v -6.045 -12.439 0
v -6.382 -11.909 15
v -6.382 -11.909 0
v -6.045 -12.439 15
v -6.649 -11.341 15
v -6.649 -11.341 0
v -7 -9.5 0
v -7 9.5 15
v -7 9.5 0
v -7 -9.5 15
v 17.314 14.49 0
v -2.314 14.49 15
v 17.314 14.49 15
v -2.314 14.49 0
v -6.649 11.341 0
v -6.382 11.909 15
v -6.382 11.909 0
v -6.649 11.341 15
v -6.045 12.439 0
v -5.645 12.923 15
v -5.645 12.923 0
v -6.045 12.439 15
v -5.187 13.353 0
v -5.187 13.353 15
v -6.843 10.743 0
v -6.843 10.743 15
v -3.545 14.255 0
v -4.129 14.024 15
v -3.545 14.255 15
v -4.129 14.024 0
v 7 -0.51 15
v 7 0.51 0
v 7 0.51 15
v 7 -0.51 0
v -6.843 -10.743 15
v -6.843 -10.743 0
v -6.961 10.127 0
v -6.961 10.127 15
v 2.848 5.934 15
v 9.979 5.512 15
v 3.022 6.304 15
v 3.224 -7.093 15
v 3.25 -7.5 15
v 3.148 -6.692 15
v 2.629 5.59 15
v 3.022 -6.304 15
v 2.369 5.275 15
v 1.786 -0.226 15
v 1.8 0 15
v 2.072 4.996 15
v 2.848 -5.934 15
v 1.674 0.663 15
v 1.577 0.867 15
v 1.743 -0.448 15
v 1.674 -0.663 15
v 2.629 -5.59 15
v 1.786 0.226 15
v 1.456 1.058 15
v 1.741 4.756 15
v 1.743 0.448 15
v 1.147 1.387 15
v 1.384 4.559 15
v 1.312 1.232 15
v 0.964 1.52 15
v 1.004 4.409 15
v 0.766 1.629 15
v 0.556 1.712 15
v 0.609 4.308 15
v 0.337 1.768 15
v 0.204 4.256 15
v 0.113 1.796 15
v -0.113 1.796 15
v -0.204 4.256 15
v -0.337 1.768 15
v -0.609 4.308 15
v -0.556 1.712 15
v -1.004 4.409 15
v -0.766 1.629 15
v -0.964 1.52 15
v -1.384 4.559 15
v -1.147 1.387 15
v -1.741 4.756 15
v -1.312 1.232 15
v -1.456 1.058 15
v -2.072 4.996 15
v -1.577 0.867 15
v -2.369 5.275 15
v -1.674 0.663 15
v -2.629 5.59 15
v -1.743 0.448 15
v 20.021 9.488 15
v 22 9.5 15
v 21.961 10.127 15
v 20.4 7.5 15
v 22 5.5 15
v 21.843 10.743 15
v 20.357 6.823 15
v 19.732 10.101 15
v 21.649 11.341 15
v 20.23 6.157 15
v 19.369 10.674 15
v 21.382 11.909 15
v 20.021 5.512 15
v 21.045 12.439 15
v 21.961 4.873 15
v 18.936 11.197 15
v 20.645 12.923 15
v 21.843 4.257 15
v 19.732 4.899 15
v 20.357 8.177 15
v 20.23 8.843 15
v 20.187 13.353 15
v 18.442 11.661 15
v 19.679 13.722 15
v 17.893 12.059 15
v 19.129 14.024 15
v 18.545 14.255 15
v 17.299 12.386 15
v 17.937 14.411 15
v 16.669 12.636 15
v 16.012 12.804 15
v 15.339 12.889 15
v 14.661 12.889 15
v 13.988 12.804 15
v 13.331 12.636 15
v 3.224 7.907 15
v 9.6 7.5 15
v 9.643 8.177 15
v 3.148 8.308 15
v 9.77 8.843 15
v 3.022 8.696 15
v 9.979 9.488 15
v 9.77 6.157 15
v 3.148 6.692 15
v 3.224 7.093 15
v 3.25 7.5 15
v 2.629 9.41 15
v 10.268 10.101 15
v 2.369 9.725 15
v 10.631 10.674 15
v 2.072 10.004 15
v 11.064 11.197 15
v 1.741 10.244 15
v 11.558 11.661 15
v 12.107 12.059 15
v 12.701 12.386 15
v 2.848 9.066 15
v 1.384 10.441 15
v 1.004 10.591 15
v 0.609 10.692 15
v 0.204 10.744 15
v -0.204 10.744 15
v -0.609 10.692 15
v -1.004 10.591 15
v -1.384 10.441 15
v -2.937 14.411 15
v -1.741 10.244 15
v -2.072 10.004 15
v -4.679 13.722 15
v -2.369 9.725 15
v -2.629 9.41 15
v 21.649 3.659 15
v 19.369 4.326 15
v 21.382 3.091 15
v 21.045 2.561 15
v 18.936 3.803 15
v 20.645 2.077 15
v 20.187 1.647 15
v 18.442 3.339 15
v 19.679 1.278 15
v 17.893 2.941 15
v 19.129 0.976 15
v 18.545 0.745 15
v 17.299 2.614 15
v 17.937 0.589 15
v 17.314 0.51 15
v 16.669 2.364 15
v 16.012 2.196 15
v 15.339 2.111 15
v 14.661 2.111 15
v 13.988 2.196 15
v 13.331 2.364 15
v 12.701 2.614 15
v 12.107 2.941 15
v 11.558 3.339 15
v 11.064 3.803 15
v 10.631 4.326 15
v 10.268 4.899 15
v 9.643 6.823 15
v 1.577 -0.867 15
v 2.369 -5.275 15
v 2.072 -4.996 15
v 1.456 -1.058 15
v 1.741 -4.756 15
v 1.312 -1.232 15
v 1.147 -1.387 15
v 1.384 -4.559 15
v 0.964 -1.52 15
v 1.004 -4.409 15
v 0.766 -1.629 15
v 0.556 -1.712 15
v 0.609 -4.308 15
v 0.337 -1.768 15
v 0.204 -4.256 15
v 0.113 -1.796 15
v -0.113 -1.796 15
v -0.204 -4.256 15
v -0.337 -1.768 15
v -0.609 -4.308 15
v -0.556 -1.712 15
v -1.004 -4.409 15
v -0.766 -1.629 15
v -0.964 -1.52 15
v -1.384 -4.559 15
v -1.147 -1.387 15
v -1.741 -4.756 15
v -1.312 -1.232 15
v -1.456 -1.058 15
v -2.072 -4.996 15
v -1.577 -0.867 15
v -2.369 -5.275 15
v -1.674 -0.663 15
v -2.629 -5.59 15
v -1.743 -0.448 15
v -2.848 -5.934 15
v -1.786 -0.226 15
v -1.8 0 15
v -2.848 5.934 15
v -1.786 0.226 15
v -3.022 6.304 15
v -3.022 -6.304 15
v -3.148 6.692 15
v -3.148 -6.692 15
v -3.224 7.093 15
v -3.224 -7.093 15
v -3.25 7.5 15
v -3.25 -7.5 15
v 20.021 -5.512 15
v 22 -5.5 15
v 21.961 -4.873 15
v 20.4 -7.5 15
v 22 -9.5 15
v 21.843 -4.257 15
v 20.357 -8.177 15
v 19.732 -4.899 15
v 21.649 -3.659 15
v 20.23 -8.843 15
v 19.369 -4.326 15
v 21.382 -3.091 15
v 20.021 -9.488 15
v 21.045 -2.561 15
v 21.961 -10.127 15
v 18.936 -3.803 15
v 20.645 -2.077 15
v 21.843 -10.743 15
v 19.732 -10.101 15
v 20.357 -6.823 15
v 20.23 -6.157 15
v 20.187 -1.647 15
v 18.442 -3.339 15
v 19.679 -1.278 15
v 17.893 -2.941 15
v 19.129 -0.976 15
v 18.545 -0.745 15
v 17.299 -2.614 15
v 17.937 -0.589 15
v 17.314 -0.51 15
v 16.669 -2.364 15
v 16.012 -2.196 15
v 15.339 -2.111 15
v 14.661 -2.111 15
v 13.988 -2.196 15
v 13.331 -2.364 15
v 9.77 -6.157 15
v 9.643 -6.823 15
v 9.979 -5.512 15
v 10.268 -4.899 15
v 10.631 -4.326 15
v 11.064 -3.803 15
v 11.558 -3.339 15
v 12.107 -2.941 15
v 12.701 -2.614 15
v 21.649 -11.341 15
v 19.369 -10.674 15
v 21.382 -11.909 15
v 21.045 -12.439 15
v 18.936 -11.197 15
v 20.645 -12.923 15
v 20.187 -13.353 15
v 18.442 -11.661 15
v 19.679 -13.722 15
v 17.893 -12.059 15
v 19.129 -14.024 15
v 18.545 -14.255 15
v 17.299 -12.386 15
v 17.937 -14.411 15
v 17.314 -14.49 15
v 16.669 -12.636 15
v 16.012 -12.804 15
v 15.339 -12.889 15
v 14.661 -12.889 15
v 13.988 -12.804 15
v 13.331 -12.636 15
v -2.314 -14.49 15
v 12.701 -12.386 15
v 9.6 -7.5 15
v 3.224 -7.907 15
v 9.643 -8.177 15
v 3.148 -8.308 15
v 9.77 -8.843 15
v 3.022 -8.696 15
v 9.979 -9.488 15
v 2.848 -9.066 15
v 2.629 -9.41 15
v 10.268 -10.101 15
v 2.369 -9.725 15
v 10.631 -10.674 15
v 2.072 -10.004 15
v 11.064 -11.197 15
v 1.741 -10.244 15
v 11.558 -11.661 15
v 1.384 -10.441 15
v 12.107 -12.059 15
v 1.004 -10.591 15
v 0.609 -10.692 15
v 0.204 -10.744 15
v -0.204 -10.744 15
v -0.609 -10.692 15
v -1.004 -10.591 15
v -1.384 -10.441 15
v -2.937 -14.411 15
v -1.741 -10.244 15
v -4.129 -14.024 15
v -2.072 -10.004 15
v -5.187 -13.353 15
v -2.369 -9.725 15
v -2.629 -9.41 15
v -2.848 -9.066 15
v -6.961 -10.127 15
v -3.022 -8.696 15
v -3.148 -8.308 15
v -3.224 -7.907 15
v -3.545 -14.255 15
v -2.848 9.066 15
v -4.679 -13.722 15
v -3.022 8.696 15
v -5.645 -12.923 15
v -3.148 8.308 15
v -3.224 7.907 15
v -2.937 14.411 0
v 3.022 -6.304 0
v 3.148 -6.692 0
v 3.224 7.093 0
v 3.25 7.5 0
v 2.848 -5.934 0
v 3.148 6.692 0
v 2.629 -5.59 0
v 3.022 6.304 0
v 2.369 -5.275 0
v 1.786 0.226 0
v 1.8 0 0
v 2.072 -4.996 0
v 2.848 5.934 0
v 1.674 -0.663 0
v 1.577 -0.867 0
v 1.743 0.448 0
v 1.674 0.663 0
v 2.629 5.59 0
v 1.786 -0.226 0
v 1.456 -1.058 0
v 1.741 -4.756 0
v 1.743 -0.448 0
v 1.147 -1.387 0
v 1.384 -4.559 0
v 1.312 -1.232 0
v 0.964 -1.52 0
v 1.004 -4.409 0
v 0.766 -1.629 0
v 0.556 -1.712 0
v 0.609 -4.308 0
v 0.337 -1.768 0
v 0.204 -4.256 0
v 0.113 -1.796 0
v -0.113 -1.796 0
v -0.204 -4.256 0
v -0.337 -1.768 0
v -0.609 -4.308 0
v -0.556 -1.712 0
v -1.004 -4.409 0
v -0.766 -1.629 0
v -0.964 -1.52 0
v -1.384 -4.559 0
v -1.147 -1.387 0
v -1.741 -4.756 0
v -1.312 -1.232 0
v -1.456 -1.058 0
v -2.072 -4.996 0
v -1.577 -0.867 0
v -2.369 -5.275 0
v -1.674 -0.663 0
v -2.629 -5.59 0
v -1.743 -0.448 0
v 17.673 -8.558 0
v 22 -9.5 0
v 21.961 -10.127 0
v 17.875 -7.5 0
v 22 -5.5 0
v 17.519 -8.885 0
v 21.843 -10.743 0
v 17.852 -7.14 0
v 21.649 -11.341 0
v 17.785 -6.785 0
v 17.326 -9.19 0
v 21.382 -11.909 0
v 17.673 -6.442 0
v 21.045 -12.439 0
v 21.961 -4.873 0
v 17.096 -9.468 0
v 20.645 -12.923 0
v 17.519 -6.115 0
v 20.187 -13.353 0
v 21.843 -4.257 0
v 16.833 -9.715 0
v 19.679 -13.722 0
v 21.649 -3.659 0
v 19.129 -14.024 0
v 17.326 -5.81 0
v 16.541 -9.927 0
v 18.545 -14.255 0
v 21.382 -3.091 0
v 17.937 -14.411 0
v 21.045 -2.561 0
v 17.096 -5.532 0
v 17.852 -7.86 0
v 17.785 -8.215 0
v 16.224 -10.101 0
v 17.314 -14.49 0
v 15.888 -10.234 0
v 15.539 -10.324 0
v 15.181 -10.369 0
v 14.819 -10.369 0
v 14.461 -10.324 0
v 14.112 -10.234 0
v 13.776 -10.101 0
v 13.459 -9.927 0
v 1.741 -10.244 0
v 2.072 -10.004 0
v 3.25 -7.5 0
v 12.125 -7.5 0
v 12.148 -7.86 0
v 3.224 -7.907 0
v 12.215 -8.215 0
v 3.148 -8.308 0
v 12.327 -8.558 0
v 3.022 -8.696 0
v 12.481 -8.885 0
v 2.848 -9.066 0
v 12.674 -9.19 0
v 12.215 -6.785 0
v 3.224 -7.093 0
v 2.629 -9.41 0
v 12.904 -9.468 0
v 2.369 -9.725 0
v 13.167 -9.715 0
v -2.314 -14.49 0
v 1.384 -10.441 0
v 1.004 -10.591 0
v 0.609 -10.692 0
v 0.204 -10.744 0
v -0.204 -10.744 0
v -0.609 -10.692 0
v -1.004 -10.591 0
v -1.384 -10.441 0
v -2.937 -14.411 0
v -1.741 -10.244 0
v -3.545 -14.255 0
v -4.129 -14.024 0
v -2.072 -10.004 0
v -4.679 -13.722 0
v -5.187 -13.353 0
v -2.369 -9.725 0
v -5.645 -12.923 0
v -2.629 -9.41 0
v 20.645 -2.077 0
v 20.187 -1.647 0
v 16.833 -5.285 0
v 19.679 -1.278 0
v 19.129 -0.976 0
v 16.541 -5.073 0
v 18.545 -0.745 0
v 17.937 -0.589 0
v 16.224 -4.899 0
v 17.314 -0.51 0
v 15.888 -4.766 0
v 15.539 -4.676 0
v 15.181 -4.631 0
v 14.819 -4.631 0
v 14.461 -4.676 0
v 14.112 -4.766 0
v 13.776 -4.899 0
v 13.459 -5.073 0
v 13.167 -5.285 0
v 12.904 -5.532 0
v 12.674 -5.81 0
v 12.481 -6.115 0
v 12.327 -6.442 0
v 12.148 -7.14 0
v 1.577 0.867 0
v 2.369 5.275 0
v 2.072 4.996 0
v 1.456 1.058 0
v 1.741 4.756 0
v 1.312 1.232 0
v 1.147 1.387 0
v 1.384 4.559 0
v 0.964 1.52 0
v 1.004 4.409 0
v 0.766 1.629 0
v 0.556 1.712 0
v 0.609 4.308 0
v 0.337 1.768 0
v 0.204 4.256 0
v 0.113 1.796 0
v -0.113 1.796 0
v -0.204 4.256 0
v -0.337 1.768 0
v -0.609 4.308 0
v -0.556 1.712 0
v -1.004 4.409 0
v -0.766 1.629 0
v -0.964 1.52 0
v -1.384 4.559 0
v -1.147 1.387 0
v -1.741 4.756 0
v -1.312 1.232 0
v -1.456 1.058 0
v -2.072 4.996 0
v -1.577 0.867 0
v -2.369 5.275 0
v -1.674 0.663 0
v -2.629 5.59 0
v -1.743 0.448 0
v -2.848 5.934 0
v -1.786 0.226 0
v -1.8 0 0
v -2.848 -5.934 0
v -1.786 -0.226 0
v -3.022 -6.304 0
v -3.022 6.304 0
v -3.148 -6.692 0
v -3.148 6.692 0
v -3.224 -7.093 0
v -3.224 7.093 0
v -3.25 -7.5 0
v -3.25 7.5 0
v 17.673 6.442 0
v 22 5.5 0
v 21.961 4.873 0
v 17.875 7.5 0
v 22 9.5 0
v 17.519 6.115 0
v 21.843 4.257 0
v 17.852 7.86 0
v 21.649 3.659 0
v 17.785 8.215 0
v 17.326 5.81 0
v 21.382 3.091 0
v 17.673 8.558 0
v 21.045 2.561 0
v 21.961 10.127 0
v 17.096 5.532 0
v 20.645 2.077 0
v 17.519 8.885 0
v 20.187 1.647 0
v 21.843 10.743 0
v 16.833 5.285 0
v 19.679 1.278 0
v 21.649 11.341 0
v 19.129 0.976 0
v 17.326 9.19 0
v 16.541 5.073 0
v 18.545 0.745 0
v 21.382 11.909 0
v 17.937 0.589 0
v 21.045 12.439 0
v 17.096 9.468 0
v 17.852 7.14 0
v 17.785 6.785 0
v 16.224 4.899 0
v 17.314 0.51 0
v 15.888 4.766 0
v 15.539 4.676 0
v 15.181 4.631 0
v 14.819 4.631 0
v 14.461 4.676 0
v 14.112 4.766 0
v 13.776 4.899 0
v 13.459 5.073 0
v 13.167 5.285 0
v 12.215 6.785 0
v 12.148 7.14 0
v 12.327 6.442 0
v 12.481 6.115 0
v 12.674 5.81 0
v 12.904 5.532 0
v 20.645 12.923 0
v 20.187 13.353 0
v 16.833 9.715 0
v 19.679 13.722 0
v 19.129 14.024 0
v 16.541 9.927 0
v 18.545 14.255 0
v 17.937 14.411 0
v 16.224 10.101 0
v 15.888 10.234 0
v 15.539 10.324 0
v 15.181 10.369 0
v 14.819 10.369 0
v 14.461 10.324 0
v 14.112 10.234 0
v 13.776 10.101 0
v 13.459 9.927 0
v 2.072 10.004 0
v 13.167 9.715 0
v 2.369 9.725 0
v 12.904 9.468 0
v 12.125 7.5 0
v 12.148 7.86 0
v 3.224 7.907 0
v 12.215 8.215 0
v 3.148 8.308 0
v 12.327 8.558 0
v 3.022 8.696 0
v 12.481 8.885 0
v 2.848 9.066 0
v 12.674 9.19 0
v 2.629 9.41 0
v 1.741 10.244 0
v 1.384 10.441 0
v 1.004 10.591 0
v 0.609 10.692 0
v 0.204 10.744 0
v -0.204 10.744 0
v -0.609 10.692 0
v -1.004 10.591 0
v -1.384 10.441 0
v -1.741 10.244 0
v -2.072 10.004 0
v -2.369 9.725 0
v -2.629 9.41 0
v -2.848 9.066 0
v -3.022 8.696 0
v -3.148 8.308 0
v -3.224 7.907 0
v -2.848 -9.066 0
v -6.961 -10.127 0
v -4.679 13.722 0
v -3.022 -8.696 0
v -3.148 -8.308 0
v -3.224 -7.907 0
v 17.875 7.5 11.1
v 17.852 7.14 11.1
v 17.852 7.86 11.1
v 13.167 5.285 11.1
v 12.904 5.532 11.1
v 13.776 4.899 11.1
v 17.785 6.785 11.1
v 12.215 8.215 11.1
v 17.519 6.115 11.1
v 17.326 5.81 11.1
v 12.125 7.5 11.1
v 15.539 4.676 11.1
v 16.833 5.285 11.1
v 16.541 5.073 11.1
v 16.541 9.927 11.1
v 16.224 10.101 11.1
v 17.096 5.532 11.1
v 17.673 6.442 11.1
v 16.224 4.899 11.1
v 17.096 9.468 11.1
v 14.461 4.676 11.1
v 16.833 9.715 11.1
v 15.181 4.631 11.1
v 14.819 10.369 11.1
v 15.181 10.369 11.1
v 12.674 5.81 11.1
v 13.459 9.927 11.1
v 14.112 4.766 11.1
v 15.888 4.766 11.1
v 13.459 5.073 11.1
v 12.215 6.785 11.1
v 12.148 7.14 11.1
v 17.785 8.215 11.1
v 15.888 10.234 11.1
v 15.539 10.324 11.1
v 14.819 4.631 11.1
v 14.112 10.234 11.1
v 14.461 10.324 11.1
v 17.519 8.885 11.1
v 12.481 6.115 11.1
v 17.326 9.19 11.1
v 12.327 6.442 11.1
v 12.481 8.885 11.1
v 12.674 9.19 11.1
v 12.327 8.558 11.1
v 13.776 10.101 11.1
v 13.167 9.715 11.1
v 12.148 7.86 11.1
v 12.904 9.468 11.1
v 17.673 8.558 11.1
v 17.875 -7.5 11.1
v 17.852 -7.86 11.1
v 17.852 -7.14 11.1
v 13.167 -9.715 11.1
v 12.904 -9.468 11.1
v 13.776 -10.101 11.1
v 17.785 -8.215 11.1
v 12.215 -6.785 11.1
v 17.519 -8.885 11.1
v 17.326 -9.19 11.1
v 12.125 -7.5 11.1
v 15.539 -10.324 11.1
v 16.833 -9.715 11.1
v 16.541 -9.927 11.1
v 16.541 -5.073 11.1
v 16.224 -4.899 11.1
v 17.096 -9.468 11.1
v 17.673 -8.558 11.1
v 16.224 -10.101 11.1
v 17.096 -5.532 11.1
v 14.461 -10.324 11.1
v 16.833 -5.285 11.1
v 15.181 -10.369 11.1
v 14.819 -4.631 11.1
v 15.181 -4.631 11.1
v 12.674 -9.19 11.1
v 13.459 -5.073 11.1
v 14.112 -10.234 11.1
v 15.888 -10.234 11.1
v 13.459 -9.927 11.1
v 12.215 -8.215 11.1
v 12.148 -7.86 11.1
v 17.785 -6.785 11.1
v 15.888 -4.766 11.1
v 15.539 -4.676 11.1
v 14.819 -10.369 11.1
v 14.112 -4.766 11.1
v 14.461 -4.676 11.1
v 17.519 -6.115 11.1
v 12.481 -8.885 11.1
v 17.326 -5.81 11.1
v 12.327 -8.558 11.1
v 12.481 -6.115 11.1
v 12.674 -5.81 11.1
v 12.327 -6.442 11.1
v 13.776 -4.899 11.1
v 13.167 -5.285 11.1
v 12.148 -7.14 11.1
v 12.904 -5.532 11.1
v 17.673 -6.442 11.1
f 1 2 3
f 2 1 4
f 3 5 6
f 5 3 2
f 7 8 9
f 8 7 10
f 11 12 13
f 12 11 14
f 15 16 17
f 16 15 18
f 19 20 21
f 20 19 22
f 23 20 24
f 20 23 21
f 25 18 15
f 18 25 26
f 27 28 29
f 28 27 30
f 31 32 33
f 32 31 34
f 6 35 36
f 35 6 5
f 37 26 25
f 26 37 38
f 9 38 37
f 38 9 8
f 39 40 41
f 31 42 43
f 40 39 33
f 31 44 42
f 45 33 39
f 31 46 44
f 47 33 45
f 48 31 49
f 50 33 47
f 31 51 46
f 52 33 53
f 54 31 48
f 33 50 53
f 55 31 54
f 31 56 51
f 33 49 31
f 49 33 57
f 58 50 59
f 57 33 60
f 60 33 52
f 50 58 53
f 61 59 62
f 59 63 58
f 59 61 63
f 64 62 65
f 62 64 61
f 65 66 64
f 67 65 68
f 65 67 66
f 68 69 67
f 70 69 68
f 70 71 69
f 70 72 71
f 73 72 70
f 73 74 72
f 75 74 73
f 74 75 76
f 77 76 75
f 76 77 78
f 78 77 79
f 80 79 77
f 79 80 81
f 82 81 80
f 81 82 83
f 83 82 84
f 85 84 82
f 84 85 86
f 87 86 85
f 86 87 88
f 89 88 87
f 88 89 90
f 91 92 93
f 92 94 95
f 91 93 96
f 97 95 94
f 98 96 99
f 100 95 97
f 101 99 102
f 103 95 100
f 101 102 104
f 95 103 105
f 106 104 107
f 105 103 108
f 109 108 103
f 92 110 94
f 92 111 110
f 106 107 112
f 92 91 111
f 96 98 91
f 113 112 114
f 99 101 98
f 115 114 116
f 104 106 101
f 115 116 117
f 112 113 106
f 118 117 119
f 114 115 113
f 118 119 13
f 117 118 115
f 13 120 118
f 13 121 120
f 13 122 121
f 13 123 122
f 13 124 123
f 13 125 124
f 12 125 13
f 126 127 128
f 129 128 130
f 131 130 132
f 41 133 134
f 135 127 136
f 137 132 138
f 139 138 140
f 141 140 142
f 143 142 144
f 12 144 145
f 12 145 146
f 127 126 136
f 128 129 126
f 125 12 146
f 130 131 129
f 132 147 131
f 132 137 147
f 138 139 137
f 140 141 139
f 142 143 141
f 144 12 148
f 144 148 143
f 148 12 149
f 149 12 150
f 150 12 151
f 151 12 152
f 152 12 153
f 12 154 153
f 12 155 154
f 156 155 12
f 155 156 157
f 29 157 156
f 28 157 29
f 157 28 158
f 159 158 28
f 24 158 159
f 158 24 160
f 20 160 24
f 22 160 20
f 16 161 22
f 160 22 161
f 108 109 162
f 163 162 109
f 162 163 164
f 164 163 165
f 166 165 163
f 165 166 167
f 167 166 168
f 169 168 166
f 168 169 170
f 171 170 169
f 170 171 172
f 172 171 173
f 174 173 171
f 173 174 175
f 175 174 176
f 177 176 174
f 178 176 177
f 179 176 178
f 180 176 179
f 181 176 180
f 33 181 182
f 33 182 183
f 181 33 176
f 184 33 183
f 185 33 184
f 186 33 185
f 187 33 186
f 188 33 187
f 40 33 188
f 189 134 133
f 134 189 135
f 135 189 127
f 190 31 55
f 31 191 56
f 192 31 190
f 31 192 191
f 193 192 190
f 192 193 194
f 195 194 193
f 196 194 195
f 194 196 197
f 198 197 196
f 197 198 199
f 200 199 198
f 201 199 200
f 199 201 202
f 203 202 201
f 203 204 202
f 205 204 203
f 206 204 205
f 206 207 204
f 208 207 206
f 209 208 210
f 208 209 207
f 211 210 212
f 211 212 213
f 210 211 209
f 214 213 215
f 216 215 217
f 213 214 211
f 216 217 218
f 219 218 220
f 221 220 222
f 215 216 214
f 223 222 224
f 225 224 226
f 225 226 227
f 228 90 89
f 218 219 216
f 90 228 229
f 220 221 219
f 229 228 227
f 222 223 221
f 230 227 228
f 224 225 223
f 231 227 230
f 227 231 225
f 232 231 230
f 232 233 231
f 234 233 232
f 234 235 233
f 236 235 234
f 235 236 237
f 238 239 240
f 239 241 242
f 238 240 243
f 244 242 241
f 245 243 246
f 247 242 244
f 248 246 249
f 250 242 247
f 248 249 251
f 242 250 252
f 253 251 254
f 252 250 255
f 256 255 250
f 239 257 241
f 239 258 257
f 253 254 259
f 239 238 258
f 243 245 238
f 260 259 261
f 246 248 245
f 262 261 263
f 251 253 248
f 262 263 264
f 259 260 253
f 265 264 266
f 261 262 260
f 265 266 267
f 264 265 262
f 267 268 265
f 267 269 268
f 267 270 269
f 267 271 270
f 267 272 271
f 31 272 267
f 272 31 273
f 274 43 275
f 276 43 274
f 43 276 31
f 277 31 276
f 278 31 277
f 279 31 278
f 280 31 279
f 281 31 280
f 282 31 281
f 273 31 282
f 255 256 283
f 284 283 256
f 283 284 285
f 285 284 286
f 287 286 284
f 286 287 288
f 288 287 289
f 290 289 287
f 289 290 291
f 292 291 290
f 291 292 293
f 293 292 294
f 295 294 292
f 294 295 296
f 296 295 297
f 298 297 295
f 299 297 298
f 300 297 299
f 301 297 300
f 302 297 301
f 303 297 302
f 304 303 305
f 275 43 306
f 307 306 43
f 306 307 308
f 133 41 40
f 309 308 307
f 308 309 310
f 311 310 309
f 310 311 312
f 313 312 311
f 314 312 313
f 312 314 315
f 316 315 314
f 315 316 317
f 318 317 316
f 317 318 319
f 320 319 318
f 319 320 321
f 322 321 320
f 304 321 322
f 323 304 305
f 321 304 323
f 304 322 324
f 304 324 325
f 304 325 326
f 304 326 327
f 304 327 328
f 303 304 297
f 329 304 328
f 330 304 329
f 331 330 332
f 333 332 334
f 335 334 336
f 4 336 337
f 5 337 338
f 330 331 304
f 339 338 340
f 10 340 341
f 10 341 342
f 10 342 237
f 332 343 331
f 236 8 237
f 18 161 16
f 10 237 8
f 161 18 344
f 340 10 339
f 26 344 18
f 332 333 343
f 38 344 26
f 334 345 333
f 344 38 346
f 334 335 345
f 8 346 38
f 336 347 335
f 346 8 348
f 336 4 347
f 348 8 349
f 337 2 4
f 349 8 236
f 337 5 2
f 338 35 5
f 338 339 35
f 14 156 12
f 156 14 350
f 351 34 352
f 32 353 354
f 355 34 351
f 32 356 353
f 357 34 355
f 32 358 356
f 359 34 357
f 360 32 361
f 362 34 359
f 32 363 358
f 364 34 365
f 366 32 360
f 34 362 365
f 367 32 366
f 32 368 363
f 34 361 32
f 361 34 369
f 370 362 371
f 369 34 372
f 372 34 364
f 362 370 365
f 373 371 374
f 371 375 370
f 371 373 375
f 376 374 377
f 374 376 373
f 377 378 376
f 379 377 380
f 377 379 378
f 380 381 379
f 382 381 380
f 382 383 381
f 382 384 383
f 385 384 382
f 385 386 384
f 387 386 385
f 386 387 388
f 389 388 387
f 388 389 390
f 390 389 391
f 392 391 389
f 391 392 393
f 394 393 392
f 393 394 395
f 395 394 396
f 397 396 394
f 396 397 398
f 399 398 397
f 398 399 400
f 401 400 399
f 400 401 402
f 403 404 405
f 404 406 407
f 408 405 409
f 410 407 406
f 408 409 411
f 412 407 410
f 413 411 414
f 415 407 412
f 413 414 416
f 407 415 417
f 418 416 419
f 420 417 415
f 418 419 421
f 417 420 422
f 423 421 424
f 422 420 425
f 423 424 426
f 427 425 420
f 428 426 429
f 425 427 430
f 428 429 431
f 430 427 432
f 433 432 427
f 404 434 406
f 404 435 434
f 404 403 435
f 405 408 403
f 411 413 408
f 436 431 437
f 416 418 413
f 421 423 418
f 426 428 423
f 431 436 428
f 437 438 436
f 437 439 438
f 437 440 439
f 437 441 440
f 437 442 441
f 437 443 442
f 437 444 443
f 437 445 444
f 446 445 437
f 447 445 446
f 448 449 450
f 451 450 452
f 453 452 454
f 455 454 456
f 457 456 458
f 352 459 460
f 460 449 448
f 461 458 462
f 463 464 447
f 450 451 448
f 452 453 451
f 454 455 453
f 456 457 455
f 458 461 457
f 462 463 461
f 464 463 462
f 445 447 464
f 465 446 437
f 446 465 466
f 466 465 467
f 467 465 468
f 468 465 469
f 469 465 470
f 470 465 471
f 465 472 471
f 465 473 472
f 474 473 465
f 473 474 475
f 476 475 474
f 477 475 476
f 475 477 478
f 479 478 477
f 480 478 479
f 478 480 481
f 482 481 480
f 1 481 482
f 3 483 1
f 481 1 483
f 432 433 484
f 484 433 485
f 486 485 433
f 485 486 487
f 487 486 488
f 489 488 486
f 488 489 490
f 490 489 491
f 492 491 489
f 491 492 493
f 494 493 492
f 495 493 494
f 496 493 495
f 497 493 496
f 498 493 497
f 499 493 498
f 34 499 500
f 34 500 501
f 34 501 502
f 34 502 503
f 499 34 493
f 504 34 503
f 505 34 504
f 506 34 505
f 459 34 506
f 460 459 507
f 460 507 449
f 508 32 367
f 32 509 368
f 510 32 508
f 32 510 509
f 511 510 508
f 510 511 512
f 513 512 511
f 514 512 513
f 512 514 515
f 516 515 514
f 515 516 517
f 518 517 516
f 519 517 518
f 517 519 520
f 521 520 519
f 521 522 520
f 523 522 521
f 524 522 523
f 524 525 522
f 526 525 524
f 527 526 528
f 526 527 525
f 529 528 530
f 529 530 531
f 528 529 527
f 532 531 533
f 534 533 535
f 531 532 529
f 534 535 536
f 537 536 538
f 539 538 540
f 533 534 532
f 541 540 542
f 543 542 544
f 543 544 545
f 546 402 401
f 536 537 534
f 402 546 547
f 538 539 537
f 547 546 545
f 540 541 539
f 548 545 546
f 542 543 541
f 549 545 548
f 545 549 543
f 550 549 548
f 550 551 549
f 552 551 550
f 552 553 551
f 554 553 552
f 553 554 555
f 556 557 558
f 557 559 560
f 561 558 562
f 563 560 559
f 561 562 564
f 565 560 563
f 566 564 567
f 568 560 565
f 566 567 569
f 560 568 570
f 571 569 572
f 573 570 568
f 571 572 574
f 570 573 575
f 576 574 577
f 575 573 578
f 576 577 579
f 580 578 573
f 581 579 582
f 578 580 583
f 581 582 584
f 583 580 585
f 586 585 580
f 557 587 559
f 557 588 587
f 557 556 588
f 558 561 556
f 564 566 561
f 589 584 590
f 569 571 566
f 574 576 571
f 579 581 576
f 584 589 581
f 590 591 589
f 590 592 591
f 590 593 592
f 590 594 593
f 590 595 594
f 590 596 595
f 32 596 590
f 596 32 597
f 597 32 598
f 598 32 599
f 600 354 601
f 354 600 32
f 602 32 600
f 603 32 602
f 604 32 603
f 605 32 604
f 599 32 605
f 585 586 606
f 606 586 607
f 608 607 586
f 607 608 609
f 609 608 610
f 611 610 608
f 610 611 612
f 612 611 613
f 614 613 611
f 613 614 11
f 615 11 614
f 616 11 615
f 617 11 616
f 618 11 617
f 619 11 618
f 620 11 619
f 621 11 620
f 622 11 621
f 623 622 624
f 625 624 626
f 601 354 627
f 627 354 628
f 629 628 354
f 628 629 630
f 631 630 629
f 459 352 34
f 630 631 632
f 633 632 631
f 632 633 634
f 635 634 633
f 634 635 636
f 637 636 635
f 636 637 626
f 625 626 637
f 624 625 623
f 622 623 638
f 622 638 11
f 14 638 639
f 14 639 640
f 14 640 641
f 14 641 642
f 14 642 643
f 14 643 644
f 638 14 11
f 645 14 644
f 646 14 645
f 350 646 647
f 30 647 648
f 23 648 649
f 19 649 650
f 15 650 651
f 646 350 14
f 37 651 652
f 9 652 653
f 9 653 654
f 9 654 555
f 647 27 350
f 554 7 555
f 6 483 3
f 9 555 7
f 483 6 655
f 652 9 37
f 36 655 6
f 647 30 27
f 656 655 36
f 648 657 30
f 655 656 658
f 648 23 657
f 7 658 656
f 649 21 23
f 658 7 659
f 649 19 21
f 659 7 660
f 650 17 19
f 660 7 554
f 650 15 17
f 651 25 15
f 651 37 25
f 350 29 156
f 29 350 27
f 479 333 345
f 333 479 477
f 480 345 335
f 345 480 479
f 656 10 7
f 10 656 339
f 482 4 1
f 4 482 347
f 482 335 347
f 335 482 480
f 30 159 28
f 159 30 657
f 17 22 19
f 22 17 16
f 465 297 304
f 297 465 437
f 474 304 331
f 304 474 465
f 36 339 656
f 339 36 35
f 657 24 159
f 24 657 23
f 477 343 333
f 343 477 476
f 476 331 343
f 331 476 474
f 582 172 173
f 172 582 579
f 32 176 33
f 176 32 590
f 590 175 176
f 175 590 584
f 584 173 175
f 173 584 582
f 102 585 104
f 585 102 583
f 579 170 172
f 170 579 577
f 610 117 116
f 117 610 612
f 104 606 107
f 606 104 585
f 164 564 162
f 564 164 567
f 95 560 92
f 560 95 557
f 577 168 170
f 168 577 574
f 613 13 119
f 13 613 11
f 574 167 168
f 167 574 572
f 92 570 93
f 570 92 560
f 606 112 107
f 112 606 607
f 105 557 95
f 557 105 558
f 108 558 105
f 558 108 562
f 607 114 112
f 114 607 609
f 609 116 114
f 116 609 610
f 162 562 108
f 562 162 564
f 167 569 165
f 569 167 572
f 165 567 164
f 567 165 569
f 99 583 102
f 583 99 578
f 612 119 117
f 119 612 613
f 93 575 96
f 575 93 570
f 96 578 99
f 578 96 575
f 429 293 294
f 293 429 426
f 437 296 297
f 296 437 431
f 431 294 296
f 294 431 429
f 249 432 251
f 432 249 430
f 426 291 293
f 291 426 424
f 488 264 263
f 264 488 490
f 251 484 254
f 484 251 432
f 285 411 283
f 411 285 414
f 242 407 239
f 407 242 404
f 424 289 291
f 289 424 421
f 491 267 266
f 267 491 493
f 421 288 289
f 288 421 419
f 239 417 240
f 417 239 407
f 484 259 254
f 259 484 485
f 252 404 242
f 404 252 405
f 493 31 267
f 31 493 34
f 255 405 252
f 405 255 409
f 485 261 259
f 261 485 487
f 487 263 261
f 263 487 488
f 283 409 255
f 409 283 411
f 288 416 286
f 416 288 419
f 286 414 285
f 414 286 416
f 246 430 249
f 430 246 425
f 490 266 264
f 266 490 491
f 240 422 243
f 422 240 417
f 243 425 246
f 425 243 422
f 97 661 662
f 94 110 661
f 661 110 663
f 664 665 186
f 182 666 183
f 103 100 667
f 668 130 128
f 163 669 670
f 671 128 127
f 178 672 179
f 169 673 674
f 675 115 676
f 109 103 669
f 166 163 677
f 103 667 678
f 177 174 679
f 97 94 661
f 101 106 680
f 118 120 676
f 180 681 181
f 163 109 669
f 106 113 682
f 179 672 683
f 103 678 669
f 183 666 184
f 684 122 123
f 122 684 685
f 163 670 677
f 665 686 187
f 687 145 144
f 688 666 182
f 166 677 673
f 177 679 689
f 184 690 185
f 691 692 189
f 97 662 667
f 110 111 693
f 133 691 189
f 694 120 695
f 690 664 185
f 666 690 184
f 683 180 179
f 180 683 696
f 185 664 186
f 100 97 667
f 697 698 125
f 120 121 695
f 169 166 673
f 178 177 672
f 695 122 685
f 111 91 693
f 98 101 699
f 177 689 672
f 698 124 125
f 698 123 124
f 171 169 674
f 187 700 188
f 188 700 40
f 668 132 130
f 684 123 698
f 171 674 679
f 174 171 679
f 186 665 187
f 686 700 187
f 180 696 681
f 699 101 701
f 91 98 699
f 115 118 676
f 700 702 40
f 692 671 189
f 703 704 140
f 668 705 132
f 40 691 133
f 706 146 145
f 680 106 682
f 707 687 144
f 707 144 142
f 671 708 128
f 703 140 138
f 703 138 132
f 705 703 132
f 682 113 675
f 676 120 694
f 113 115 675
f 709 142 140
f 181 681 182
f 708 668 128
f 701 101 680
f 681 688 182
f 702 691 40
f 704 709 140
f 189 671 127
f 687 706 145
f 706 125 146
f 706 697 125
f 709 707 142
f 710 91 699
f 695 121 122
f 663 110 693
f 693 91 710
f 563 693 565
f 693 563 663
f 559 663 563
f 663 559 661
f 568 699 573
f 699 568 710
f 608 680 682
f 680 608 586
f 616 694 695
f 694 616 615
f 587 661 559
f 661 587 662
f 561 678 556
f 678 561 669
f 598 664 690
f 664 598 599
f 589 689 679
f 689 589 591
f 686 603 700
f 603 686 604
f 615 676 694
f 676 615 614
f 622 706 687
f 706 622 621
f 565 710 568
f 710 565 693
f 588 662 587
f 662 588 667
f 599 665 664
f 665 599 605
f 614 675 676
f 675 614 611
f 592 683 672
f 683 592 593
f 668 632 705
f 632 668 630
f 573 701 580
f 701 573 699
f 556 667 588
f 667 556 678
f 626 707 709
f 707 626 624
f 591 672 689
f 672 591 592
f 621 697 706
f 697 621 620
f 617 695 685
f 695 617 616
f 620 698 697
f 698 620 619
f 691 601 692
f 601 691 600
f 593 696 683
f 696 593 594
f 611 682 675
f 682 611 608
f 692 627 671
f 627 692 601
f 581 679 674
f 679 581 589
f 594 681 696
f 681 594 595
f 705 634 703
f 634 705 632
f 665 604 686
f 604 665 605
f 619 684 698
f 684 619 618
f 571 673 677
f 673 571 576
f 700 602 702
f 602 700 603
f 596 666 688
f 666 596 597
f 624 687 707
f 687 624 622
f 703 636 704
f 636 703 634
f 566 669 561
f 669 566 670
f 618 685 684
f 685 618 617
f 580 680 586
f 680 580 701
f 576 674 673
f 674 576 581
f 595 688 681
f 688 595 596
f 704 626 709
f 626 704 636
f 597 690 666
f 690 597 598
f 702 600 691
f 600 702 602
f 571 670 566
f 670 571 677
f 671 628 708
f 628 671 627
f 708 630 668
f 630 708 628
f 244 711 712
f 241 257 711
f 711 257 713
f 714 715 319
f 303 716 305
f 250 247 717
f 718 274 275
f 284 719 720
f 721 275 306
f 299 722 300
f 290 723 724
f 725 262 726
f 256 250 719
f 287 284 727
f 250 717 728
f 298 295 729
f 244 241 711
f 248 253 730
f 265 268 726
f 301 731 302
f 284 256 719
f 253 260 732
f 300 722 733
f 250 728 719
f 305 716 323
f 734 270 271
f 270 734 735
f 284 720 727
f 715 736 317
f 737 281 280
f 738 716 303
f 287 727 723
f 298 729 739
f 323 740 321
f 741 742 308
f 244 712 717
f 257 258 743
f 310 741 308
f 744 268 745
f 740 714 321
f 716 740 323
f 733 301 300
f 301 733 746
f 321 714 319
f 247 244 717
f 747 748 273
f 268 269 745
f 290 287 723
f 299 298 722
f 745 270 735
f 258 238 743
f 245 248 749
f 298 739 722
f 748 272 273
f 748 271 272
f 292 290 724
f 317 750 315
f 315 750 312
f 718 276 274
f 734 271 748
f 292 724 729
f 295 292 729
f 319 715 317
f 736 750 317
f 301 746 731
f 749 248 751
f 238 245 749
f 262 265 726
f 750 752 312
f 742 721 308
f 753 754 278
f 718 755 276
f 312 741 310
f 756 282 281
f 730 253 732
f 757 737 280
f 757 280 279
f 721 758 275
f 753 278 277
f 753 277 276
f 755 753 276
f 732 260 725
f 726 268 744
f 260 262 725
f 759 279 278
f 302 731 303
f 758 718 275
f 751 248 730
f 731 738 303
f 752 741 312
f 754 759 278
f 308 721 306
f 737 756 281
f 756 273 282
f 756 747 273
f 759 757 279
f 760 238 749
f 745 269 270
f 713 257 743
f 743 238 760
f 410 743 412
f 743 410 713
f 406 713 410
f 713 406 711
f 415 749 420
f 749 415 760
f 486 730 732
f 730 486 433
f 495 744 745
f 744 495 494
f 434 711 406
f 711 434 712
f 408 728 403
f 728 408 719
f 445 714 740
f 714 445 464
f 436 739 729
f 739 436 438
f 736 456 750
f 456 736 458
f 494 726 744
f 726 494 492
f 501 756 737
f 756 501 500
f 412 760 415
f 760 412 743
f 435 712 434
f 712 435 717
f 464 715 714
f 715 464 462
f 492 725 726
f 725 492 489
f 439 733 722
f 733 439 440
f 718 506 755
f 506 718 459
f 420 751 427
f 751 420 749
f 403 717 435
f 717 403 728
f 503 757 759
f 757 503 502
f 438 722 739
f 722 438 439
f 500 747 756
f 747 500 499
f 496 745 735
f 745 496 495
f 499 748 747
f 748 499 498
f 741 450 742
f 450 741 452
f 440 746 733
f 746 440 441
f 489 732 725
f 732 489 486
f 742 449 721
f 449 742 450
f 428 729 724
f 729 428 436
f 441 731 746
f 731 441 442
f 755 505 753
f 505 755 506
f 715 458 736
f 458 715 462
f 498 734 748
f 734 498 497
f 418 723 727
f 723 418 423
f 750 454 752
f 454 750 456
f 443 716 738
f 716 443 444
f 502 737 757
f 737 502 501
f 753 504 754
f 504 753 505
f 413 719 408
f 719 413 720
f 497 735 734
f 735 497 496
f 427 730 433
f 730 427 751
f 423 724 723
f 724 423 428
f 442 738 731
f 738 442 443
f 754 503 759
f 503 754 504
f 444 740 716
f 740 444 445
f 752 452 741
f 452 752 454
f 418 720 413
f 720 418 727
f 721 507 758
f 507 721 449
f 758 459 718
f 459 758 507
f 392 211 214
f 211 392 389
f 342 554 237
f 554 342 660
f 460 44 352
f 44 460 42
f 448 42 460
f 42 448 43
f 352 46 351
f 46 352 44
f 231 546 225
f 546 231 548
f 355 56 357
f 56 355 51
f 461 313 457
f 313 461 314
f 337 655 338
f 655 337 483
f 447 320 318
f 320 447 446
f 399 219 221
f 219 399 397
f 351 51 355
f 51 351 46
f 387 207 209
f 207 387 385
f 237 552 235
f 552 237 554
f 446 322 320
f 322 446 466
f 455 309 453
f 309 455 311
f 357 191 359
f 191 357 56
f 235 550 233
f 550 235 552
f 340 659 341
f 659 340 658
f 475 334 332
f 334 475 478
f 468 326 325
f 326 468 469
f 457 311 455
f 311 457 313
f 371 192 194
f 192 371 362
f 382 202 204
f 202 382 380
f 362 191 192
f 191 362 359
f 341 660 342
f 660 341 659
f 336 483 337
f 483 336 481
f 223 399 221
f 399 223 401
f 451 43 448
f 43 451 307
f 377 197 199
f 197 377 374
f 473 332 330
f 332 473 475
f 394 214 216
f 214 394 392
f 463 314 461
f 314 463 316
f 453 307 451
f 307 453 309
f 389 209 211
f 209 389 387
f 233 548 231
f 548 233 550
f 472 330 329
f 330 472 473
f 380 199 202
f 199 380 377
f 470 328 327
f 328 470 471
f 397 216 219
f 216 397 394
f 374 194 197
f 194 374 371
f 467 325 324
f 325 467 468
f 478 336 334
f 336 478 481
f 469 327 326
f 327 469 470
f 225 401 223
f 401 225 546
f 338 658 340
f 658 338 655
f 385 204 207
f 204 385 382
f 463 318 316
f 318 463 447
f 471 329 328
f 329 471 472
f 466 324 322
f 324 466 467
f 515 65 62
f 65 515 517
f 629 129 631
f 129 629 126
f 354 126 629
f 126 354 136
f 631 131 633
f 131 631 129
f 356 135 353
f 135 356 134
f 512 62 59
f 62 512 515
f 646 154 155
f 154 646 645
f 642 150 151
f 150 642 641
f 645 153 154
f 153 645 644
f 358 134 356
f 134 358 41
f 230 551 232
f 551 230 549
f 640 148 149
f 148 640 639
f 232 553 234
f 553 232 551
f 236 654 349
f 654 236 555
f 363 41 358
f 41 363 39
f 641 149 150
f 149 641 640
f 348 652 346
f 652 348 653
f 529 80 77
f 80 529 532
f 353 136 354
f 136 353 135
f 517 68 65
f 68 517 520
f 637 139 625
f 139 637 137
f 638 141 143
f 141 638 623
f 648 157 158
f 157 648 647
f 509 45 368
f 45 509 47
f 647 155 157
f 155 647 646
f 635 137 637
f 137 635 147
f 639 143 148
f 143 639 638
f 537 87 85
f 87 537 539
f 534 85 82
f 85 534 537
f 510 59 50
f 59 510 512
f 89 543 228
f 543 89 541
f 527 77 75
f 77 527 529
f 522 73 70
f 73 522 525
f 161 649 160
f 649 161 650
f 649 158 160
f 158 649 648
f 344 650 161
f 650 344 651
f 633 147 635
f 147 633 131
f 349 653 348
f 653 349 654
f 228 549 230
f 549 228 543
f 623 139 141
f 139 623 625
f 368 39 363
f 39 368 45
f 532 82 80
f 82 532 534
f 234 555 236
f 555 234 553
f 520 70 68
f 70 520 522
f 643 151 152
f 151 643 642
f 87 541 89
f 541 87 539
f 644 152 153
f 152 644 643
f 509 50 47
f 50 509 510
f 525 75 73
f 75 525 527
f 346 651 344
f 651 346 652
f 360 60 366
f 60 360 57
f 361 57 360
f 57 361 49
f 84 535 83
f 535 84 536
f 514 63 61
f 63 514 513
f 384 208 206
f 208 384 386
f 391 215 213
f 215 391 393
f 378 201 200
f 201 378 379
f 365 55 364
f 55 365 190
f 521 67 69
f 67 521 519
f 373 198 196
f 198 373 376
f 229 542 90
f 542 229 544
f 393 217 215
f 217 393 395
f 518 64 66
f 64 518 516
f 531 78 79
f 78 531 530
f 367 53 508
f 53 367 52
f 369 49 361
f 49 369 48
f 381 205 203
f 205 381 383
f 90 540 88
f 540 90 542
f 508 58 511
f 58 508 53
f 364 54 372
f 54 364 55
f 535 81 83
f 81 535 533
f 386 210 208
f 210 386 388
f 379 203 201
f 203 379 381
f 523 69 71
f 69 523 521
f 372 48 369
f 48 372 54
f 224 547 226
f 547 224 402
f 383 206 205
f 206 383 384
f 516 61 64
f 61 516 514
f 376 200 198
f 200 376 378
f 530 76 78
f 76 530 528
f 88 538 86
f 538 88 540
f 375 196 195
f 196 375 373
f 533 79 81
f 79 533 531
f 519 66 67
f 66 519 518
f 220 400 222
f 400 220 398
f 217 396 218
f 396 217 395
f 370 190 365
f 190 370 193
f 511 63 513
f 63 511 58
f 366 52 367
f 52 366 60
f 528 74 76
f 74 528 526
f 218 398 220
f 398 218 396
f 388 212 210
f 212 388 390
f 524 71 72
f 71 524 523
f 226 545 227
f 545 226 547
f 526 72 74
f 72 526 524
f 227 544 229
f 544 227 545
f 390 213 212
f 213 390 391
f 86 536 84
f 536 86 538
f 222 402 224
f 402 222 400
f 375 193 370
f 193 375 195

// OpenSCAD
$fn = 50;


difference() {
	union() {
		hull() {
			translate(v = [-2.0000000000, 9.5000000000, 0]) {
				cylinder(h = 15, r = 5);
			}
			translate(v = [2.0000000000, 9.5000000000, 0]) {
				cylinder(h = 15, r = 5);
			}
			translate(v = [-2.0000000000, -9.5000000000, 0]) {
				cylinder(h = 15, r = 5);
			}
			translate(v = [2.0000000000, -9.5000000000, 0]) {
				cylinder(h = 15, r = 5);
			}
		}
		translate(v = [7.5000000000, 7.5000000000, 0]) {
			hull() {
				translate(v = [-9.5000000000, 2.0000000000, 0]) {
					cylinder(h = 15, r = 5);
				}
				translate(v = [9.5000000000, 2.0000000000, 0]) {
					cylinder(h = 15, r = 5);
				}
				translate(v = [-9.5000000000, -2.0000000000, 0]) {
					cylinder(h = 15, r = 5);
				}
				translate(v = [9.5000000000, -2.0000000000, 0]) {
					cylinder(h = 15, r = 5);
				}
			}
		}
		translate(v = [7.5000000000, -7.5000000000, 0]) {
			hull() {
				translate(v = [-9.5000000000, 2.0000000000, 0]) {
					cylinder(h = 15, r = 5);
				}
				translate(v = [9.5000000000, 2.0000000000, 0]) {
					cylinder(h = 15, r = 5);
				}
				translate(v = [-9.5000000000, -2.0000000000, 0]) {
					cylinder(h = 15, r = 5);
				}
				translate(v = [9.5000000000, -2.0000000000, 0]) {
					cylinder(h = 15, r = 5);
				}
			}
		}
	}
	union() {
		translate(v = [15.0000000000, 7.5000000000, 15]) {
			rotate(a = [0, 0, 0]) {
				difference() {
					union() {
						#translate(v = [0, 0, -15.0000000000]) {
							cylinder(h = 15, r = 2.6000000000);
						}
						#translate(v = [0, 0, -3.9000000000]) {
							cylinder(h = 3.9000000000, r1 = 2.8750000000, r2 = 5.4000000000);
						}
						#translate(v = [0, 0, -15.0000000000]) {
							cylinder(h = 15, r = 2.8750000000);
						}
						#translate(v = [0, 0, -15.0000000000]) {
							cylinder(h = 15, r = 2.6000000000);
						}
					}
					union();
				}
			}
		}
		translate(v = [15.0000000000, -7.5000000000, 15]) {
			rotate(a = [0, 0, 0]) {
				difference() {
					union() {
						#translate(v = [0, 0, -15.0000000000]) {
							cylinder(h = 15, r = 2.6000000000);
						}
						#translate(v = [0, 0, -3.9000000000]) {
							cylinder(h = 3.9000000000, r1 = 2.8750000000, r2 = 5.4000000000);
						}
						#translate(v = [0, 0, -15.0000000000]) {
							cylinder(h = 15, r = 2.8750000000);
						}
						#translate(v = [0, 0, -15.0000000000]) {
							cylinder(h = 15, r = 2.6000000000);
						}
					}
					union();
				}
			}
		}
		translate(v = [0.0000000000, -7.5000000000, 0]) {
			translate(v = [0, 0, -100]) {
				cylinder(h = 200, r = 3.2500000000);
			}
		}
		translate(v = [0.0000000000, 7.5000000000, 0]) {
			translate(v = [0, 0, -100]) {
				cylinder(h = 200, r = 3.2500000000);
			}
		}
		translate(v = [0.0000000000, -7.5000000000, 0]) {
			translate(v = [0, 0, -100]) {
				cylinder(h = 200, r = 1.8000000000);
			}
		}
		translate(v = [0, 0, -100]) {
			cylinder(h = 200, r = 1.8000000000);
		}
		translate(v = [0.0000000000, 7.5000000000, 0]) {
			translate(v = [0, 0, -100]) {
				cylinder(h = 200, r = 1.8000000000);
			}
		}
	}
}
